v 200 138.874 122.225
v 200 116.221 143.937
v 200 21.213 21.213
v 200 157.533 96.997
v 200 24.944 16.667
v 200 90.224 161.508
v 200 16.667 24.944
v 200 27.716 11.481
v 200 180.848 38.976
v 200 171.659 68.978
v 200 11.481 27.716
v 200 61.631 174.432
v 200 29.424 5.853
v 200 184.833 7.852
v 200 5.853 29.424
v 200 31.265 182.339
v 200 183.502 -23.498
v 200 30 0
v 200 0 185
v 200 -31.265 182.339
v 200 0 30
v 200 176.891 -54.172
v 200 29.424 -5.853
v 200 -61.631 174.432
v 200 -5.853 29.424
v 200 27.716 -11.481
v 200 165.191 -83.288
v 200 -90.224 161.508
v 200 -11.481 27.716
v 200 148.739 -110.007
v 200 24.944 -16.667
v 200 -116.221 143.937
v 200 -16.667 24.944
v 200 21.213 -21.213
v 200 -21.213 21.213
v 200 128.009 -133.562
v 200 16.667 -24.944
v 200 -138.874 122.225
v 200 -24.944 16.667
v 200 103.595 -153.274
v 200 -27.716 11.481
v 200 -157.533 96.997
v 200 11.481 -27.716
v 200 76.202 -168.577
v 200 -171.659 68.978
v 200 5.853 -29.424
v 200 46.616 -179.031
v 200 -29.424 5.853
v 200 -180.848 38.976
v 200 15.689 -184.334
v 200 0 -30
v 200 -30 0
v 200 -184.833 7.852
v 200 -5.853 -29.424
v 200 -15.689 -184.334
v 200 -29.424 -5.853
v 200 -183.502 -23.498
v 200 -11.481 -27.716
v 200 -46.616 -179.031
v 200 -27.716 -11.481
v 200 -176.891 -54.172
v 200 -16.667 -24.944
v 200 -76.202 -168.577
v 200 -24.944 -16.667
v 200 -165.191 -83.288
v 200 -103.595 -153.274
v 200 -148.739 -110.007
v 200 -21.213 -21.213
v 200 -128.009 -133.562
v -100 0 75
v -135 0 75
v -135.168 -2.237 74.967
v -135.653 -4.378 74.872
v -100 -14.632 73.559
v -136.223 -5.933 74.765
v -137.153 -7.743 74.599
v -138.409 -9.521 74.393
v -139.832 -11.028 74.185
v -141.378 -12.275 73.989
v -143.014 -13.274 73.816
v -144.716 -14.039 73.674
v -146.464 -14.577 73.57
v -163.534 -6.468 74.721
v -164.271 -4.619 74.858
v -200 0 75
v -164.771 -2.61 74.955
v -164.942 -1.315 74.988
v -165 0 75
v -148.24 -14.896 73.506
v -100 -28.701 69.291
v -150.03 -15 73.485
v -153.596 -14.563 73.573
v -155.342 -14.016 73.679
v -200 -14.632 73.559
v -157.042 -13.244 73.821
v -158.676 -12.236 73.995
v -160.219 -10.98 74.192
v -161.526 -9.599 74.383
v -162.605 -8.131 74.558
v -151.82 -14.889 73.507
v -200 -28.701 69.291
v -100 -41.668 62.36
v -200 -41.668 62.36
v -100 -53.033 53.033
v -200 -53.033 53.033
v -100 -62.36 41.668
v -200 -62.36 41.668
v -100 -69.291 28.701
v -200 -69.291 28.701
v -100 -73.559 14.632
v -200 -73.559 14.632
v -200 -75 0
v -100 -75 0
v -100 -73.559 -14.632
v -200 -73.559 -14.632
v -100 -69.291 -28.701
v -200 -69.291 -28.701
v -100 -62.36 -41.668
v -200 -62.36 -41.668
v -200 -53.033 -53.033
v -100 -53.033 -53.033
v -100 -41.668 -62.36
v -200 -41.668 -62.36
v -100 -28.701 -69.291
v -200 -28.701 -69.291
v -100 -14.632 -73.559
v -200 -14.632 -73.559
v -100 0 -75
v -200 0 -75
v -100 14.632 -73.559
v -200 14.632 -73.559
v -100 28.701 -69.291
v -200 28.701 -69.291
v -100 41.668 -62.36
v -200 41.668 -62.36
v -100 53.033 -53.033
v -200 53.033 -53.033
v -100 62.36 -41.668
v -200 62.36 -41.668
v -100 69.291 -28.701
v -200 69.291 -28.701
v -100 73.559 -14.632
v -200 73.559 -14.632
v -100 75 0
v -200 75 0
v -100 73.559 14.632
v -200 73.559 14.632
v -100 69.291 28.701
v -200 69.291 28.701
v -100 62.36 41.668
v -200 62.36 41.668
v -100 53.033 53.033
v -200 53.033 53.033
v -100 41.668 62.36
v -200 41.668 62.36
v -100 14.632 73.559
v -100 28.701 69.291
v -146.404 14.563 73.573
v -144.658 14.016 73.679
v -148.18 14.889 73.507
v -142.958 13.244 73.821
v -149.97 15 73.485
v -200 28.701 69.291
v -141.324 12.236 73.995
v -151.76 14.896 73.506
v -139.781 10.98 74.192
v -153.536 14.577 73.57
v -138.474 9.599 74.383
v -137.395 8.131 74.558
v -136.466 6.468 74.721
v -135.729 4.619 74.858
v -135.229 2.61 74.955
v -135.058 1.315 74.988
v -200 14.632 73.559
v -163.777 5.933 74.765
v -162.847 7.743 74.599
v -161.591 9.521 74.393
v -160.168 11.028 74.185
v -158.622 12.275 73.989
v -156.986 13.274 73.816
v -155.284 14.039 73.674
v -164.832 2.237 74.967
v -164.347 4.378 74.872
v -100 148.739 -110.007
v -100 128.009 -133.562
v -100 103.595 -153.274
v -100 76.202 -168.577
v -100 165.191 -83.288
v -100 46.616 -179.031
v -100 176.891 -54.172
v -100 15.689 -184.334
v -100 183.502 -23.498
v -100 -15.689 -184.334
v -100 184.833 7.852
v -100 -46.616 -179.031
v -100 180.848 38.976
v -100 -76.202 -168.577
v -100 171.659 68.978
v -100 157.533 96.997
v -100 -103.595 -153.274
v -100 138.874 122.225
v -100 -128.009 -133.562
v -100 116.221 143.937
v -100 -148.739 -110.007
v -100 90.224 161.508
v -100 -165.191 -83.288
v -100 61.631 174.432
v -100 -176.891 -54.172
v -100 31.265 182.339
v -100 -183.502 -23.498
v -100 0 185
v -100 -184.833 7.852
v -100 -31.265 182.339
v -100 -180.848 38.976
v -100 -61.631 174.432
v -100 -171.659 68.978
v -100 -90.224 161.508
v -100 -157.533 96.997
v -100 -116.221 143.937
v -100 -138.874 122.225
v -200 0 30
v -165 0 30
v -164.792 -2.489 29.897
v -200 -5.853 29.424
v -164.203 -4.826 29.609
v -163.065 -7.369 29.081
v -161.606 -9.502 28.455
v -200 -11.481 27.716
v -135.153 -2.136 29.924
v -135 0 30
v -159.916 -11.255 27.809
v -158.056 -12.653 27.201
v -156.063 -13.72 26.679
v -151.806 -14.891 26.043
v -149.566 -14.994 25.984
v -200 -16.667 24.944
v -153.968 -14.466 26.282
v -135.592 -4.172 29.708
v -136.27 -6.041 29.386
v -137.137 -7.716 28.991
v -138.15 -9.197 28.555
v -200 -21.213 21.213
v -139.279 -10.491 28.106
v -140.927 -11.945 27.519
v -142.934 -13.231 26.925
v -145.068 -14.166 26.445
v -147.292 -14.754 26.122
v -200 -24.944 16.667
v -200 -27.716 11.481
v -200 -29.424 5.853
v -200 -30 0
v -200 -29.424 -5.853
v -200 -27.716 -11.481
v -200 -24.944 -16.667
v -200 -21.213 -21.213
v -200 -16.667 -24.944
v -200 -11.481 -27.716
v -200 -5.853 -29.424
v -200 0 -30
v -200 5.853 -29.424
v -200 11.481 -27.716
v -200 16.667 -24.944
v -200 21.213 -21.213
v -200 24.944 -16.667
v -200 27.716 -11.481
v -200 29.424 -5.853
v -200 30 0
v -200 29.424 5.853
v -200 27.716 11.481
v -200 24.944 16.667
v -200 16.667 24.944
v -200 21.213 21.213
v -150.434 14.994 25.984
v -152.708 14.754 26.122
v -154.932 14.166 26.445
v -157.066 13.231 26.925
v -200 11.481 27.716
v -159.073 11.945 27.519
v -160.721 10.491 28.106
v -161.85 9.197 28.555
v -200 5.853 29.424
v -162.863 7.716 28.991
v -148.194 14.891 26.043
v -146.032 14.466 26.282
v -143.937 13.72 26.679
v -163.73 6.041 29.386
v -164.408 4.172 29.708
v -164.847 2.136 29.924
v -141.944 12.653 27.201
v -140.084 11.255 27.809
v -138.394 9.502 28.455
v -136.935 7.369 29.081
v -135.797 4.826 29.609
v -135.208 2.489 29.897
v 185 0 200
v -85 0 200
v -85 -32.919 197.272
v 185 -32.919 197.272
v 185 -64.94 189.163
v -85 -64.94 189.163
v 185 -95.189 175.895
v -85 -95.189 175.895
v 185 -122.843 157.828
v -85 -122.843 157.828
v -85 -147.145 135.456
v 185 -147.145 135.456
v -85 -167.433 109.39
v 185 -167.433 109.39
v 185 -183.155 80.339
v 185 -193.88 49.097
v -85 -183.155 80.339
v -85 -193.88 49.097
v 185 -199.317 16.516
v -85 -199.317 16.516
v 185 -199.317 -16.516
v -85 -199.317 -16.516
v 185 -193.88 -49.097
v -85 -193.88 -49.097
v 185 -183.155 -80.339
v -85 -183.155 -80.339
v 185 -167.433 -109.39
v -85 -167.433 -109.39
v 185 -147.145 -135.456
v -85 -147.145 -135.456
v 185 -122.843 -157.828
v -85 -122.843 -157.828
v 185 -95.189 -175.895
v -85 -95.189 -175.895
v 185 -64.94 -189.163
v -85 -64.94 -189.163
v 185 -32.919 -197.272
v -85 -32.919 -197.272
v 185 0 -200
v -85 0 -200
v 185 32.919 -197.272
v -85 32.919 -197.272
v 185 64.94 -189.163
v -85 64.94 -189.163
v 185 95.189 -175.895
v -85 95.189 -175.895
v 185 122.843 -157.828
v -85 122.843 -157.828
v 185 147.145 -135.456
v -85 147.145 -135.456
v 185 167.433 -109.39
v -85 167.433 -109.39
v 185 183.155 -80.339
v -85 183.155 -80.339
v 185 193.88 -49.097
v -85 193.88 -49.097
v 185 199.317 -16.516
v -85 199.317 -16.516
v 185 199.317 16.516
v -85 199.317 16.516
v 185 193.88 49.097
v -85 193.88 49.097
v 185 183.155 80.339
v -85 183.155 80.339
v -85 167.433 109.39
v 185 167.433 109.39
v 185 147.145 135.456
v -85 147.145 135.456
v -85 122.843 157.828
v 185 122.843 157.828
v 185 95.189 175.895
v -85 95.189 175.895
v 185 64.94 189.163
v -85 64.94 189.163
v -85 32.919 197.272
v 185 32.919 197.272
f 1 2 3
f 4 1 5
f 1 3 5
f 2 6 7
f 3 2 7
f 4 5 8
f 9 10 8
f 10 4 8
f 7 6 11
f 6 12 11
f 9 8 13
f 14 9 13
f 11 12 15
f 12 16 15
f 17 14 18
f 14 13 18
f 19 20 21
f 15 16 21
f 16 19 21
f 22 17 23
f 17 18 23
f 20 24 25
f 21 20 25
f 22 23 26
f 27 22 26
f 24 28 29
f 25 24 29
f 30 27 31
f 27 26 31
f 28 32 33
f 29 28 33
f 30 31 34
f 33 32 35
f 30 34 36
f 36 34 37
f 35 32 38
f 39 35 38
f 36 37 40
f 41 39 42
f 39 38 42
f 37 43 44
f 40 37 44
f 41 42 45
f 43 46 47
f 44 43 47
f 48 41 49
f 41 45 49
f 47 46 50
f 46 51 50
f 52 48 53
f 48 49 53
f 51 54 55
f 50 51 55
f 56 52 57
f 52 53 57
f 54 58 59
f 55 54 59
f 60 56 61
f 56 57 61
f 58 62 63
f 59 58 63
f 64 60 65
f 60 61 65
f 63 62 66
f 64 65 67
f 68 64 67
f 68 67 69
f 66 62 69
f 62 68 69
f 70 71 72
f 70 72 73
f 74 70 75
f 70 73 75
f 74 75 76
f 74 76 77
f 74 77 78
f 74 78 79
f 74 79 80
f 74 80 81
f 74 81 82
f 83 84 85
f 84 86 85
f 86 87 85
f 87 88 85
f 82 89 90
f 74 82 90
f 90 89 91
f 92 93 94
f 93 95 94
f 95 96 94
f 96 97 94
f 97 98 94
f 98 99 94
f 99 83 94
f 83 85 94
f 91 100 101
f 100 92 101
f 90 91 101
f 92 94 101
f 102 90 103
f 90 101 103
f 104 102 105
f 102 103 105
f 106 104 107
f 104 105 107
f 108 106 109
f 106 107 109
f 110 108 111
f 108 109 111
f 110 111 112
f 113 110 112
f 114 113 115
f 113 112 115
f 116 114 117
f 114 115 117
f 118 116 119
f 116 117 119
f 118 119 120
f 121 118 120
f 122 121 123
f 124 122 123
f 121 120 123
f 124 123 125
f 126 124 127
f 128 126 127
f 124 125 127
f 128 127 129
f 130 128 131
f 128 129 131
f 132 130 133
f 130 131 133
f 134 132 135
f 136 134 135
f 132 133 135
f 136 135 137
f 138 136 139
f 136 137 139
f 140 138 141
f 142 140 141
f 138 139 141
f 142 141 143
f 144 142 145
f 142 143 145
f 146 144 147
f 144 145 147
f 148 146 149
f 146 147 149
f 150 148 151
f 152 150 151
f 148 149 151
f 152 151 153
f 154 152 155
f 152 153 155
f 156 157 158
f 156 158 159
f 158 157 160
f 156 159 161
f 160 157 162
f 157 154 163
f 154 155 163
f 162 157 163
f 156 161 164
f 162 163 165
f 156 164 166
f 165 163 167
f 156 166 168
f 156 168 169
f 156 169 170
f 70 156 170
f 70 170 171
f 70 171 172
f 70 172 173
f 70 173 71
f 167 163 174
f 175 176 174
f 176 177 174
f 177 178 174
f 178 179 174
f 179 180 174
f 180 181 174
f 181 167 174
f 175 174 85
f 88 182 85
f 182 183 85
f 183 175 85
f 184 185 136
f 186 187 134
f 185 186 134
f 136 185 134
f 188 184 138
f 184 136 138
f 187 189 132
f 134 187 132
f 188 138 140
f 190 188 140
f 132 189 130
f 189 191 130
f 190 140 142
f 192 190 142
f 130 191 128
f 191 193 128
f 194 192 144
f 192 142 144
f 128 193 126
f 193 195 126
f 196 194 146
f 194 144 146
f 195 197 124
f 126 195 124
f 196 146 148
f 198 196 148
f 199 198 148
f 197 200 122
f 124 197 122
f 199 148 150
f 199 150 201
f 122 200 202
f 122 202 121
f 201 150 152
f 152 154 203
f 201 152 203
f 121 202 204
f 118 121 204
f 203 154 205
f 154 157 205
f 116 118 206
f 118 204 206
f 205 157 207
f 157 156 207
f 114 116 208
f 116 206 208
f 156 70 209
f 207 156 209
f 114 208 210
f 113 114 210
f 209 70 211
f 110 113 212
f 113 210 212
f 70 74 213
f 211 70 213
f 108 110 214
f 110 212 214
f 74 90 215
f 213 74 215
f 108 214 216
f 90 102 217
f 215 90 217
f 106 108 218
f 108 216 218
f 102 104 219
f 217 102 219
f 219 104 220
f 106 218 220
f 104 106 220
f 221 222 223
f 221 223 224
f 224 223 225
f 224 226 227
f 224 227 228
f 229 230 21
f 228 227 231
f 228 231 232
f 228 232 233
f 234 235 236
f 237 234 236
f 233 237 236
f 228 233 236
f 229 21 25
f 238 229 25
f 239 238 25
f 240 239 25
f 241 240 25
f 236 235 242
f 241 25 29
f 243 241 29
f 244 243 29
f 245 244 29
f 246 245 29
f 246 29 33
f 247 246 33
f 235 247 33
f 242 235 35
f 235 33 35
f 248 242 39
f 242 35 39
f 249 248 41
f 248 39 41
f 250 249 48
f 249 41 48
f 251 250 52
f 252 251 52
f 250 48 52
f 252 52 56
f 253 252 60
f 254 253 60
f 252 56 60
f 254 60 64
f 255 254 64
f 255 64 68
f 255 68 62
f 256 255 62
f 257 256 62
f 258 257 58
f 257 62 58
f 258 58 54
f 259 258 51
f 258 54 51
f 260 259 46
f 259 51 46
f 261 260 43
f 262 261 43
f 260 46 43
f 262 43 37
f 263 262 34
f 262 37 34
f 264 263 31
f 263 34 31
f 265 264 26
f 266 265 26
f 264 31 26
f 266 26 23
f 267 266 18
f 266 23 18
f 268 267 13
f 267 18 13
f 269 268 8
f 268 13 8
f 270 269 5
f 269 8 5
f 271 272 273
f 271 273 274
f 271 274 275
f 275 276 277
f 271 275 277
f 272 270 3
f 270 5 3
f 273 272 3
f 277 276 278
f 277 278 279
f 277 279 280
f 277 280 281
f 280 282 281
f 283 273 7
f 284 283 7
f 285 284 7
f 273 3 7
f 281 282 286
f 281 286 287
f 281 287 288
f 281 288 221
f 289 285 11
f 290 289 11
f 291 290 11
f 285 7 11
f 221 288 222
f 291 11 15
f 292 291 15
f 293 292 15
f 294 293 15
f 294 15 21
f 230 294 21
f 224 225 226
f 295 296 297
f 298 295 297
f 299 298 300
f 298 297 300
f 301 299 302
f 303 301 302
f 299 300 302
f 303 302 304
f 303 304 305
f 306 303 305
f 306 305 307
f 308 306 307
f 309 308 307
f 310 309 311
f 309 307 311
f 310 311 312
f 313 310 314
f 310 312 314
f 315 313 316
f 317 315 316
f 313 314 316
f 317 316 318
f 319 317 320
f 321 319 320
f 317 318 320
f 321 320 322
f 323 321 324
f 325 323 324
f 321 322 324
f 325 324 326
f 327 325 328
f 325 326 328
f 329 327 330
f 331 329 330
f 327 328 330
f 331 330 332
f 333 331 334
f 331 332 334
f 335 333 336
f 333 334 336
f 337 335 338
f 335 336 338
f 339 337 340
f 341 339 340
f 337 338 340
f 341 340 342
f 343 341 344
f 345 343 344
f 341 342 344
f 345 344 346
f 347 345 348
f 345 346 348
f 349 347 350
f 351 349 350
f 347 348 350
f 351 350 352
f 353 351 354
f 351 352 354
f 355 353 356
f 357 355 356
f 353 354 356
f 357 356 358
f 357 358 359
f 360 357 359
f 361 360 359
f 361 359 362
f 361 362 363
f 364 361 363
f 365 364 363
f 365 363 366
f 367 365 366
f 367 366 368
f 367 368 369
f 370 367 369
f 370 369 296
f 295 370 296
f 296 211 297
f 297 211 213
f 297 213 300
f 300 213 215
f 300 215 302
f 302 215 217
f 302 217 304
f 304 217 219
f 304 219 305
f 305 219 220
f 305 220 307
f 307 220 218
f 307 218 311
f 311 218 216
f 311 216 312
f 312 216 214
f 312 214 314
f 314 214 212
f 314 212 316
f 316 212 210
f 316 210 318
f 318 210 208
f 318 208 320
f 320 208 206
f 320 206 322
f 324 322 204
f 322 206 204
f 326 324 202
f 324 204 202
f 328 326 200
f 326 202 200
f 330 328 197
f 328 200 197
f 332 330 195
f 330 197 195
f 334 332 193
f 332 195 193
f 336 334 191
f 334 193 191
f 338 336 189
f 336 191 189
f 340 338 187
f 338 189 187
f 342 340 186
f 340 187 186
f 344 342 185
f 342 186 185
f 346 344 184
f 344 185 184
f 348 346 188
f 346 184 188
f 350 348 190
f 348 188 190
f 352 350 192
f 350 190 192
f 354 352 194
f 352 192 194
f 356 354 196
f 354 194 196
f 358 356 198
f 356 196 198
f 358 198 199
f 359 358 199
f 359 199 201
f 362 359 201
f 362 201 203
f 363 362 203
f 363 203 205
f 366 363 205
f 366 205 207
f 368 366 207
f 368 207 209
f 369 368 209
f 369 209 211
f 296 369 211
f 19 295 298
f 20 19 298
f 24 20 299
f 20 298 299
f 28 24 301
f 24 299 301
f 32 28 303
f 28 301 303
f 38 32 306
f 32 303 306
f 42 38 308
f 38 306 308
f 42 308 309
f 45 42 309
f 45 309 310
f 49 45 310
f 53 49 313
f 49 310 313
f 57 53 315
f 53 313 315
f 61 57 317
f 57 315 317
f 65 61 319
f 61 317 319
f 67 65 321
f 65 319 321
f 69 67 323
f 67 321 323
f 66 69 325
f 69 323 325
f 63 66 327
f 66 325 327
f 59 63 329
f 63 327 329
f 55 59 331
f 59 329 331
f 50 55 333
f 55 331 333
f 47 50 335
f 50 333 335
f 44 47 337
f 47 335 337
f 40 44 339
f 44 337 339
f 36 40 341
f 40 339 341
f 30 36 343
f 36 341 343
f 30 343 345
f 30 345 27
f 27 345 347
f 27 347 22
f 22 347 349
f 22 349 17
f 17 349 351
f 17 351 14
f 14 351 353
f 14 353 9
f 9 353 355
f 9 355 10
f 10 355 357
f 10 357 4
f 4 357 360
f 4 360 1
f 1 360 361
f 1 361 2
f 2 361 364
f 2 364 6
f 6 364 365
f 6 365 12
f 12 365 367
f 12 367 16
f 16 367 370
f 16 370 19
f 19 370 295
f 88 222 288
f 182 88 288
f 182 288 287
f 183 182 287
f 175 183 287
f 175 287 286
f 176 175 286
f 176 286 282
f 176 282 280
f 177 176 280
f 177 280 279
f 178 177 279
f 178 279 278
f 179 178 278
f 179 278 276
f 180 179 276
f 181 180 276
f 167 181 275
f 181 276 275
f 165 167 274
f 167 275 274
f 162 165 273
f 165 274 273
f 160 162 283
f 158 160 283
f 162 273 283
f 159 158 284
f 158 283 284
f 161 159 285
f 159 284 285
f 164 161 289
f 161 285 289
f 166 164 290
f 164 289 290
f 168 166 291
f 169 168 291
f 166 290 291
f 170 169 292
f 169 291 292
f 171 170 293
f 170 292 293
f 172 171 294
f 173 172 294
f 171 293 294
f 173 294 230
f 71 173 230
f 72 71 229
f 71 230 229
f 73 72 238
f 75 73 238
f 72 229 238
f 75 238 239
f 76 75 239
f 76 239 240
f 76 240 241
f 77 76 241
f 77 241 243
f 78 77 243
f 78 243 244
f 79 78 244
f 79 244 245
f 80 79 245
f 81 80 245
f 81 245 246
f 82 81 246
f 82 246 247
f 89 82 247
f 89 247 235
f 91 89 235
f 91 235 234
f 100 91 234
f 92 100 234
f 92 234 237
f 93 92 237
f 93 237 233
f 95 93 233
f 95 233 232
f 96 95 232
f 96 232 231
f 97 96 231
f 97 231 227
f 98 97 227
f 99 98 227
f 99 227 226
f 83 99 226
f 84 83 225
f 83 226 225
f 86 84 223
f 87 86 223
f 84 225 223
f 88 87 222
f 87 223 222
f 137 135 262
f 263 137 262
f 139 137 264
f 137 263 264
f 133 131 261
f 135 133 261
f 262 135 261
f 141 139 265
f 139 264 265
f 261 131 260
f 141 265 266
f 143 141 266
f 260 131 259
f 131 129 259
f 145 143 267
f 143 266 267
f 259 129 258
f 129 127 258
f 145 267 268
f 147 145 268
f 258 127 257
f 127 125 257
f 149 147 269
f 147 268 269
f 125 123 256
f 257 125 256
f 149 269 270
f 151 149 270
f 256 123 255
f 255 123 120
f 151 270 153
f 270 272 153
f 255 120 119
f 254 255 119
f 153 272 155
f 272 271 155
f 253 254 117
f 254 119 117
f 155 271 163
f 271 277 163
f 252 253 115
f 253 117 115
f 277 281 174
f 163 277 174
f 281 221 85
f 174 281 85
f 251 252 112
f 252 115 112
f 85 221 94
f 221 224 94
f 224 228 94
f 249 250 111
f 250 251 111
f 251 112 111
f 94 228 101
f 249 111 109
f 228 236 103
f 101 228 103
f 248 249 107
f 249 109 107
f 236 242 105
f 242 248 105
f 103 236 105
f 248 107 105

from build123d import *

# Parameters (mm, degrees)
F2_SIZE2 = 15
F2_SIZE  = 15
F5_D     = 30
F5_DEPTH = 75


with BuildPart() as f1:
    # F0 (on Front) → F1 (revolve)
    with BuildSketch(Plane.XZ):
        Polygon((-200, 30), (200, 30), (200, 200), (-100, 200), (-100, 75), (-200, 75), align=None)
    revolve(axis=Axis((14.209643, 0, 0), (1, 0, 0)))

    # F2
    f2_edges = [f1.edges().sort_by_distance(p)[0] for p in [
        (-100, 0, -200),
        (200, 0, -200),
    ]]
    chamfer(f2_edges, length=F2_SIZE, length2=F2_SIZE2)

    # F5
    with Locations(Plane.XY.offset(75)):
        with Locations((-150, 0)):
            Hole(F5_D / 2, depth=F5_DEPTH)


solid = f1.part
